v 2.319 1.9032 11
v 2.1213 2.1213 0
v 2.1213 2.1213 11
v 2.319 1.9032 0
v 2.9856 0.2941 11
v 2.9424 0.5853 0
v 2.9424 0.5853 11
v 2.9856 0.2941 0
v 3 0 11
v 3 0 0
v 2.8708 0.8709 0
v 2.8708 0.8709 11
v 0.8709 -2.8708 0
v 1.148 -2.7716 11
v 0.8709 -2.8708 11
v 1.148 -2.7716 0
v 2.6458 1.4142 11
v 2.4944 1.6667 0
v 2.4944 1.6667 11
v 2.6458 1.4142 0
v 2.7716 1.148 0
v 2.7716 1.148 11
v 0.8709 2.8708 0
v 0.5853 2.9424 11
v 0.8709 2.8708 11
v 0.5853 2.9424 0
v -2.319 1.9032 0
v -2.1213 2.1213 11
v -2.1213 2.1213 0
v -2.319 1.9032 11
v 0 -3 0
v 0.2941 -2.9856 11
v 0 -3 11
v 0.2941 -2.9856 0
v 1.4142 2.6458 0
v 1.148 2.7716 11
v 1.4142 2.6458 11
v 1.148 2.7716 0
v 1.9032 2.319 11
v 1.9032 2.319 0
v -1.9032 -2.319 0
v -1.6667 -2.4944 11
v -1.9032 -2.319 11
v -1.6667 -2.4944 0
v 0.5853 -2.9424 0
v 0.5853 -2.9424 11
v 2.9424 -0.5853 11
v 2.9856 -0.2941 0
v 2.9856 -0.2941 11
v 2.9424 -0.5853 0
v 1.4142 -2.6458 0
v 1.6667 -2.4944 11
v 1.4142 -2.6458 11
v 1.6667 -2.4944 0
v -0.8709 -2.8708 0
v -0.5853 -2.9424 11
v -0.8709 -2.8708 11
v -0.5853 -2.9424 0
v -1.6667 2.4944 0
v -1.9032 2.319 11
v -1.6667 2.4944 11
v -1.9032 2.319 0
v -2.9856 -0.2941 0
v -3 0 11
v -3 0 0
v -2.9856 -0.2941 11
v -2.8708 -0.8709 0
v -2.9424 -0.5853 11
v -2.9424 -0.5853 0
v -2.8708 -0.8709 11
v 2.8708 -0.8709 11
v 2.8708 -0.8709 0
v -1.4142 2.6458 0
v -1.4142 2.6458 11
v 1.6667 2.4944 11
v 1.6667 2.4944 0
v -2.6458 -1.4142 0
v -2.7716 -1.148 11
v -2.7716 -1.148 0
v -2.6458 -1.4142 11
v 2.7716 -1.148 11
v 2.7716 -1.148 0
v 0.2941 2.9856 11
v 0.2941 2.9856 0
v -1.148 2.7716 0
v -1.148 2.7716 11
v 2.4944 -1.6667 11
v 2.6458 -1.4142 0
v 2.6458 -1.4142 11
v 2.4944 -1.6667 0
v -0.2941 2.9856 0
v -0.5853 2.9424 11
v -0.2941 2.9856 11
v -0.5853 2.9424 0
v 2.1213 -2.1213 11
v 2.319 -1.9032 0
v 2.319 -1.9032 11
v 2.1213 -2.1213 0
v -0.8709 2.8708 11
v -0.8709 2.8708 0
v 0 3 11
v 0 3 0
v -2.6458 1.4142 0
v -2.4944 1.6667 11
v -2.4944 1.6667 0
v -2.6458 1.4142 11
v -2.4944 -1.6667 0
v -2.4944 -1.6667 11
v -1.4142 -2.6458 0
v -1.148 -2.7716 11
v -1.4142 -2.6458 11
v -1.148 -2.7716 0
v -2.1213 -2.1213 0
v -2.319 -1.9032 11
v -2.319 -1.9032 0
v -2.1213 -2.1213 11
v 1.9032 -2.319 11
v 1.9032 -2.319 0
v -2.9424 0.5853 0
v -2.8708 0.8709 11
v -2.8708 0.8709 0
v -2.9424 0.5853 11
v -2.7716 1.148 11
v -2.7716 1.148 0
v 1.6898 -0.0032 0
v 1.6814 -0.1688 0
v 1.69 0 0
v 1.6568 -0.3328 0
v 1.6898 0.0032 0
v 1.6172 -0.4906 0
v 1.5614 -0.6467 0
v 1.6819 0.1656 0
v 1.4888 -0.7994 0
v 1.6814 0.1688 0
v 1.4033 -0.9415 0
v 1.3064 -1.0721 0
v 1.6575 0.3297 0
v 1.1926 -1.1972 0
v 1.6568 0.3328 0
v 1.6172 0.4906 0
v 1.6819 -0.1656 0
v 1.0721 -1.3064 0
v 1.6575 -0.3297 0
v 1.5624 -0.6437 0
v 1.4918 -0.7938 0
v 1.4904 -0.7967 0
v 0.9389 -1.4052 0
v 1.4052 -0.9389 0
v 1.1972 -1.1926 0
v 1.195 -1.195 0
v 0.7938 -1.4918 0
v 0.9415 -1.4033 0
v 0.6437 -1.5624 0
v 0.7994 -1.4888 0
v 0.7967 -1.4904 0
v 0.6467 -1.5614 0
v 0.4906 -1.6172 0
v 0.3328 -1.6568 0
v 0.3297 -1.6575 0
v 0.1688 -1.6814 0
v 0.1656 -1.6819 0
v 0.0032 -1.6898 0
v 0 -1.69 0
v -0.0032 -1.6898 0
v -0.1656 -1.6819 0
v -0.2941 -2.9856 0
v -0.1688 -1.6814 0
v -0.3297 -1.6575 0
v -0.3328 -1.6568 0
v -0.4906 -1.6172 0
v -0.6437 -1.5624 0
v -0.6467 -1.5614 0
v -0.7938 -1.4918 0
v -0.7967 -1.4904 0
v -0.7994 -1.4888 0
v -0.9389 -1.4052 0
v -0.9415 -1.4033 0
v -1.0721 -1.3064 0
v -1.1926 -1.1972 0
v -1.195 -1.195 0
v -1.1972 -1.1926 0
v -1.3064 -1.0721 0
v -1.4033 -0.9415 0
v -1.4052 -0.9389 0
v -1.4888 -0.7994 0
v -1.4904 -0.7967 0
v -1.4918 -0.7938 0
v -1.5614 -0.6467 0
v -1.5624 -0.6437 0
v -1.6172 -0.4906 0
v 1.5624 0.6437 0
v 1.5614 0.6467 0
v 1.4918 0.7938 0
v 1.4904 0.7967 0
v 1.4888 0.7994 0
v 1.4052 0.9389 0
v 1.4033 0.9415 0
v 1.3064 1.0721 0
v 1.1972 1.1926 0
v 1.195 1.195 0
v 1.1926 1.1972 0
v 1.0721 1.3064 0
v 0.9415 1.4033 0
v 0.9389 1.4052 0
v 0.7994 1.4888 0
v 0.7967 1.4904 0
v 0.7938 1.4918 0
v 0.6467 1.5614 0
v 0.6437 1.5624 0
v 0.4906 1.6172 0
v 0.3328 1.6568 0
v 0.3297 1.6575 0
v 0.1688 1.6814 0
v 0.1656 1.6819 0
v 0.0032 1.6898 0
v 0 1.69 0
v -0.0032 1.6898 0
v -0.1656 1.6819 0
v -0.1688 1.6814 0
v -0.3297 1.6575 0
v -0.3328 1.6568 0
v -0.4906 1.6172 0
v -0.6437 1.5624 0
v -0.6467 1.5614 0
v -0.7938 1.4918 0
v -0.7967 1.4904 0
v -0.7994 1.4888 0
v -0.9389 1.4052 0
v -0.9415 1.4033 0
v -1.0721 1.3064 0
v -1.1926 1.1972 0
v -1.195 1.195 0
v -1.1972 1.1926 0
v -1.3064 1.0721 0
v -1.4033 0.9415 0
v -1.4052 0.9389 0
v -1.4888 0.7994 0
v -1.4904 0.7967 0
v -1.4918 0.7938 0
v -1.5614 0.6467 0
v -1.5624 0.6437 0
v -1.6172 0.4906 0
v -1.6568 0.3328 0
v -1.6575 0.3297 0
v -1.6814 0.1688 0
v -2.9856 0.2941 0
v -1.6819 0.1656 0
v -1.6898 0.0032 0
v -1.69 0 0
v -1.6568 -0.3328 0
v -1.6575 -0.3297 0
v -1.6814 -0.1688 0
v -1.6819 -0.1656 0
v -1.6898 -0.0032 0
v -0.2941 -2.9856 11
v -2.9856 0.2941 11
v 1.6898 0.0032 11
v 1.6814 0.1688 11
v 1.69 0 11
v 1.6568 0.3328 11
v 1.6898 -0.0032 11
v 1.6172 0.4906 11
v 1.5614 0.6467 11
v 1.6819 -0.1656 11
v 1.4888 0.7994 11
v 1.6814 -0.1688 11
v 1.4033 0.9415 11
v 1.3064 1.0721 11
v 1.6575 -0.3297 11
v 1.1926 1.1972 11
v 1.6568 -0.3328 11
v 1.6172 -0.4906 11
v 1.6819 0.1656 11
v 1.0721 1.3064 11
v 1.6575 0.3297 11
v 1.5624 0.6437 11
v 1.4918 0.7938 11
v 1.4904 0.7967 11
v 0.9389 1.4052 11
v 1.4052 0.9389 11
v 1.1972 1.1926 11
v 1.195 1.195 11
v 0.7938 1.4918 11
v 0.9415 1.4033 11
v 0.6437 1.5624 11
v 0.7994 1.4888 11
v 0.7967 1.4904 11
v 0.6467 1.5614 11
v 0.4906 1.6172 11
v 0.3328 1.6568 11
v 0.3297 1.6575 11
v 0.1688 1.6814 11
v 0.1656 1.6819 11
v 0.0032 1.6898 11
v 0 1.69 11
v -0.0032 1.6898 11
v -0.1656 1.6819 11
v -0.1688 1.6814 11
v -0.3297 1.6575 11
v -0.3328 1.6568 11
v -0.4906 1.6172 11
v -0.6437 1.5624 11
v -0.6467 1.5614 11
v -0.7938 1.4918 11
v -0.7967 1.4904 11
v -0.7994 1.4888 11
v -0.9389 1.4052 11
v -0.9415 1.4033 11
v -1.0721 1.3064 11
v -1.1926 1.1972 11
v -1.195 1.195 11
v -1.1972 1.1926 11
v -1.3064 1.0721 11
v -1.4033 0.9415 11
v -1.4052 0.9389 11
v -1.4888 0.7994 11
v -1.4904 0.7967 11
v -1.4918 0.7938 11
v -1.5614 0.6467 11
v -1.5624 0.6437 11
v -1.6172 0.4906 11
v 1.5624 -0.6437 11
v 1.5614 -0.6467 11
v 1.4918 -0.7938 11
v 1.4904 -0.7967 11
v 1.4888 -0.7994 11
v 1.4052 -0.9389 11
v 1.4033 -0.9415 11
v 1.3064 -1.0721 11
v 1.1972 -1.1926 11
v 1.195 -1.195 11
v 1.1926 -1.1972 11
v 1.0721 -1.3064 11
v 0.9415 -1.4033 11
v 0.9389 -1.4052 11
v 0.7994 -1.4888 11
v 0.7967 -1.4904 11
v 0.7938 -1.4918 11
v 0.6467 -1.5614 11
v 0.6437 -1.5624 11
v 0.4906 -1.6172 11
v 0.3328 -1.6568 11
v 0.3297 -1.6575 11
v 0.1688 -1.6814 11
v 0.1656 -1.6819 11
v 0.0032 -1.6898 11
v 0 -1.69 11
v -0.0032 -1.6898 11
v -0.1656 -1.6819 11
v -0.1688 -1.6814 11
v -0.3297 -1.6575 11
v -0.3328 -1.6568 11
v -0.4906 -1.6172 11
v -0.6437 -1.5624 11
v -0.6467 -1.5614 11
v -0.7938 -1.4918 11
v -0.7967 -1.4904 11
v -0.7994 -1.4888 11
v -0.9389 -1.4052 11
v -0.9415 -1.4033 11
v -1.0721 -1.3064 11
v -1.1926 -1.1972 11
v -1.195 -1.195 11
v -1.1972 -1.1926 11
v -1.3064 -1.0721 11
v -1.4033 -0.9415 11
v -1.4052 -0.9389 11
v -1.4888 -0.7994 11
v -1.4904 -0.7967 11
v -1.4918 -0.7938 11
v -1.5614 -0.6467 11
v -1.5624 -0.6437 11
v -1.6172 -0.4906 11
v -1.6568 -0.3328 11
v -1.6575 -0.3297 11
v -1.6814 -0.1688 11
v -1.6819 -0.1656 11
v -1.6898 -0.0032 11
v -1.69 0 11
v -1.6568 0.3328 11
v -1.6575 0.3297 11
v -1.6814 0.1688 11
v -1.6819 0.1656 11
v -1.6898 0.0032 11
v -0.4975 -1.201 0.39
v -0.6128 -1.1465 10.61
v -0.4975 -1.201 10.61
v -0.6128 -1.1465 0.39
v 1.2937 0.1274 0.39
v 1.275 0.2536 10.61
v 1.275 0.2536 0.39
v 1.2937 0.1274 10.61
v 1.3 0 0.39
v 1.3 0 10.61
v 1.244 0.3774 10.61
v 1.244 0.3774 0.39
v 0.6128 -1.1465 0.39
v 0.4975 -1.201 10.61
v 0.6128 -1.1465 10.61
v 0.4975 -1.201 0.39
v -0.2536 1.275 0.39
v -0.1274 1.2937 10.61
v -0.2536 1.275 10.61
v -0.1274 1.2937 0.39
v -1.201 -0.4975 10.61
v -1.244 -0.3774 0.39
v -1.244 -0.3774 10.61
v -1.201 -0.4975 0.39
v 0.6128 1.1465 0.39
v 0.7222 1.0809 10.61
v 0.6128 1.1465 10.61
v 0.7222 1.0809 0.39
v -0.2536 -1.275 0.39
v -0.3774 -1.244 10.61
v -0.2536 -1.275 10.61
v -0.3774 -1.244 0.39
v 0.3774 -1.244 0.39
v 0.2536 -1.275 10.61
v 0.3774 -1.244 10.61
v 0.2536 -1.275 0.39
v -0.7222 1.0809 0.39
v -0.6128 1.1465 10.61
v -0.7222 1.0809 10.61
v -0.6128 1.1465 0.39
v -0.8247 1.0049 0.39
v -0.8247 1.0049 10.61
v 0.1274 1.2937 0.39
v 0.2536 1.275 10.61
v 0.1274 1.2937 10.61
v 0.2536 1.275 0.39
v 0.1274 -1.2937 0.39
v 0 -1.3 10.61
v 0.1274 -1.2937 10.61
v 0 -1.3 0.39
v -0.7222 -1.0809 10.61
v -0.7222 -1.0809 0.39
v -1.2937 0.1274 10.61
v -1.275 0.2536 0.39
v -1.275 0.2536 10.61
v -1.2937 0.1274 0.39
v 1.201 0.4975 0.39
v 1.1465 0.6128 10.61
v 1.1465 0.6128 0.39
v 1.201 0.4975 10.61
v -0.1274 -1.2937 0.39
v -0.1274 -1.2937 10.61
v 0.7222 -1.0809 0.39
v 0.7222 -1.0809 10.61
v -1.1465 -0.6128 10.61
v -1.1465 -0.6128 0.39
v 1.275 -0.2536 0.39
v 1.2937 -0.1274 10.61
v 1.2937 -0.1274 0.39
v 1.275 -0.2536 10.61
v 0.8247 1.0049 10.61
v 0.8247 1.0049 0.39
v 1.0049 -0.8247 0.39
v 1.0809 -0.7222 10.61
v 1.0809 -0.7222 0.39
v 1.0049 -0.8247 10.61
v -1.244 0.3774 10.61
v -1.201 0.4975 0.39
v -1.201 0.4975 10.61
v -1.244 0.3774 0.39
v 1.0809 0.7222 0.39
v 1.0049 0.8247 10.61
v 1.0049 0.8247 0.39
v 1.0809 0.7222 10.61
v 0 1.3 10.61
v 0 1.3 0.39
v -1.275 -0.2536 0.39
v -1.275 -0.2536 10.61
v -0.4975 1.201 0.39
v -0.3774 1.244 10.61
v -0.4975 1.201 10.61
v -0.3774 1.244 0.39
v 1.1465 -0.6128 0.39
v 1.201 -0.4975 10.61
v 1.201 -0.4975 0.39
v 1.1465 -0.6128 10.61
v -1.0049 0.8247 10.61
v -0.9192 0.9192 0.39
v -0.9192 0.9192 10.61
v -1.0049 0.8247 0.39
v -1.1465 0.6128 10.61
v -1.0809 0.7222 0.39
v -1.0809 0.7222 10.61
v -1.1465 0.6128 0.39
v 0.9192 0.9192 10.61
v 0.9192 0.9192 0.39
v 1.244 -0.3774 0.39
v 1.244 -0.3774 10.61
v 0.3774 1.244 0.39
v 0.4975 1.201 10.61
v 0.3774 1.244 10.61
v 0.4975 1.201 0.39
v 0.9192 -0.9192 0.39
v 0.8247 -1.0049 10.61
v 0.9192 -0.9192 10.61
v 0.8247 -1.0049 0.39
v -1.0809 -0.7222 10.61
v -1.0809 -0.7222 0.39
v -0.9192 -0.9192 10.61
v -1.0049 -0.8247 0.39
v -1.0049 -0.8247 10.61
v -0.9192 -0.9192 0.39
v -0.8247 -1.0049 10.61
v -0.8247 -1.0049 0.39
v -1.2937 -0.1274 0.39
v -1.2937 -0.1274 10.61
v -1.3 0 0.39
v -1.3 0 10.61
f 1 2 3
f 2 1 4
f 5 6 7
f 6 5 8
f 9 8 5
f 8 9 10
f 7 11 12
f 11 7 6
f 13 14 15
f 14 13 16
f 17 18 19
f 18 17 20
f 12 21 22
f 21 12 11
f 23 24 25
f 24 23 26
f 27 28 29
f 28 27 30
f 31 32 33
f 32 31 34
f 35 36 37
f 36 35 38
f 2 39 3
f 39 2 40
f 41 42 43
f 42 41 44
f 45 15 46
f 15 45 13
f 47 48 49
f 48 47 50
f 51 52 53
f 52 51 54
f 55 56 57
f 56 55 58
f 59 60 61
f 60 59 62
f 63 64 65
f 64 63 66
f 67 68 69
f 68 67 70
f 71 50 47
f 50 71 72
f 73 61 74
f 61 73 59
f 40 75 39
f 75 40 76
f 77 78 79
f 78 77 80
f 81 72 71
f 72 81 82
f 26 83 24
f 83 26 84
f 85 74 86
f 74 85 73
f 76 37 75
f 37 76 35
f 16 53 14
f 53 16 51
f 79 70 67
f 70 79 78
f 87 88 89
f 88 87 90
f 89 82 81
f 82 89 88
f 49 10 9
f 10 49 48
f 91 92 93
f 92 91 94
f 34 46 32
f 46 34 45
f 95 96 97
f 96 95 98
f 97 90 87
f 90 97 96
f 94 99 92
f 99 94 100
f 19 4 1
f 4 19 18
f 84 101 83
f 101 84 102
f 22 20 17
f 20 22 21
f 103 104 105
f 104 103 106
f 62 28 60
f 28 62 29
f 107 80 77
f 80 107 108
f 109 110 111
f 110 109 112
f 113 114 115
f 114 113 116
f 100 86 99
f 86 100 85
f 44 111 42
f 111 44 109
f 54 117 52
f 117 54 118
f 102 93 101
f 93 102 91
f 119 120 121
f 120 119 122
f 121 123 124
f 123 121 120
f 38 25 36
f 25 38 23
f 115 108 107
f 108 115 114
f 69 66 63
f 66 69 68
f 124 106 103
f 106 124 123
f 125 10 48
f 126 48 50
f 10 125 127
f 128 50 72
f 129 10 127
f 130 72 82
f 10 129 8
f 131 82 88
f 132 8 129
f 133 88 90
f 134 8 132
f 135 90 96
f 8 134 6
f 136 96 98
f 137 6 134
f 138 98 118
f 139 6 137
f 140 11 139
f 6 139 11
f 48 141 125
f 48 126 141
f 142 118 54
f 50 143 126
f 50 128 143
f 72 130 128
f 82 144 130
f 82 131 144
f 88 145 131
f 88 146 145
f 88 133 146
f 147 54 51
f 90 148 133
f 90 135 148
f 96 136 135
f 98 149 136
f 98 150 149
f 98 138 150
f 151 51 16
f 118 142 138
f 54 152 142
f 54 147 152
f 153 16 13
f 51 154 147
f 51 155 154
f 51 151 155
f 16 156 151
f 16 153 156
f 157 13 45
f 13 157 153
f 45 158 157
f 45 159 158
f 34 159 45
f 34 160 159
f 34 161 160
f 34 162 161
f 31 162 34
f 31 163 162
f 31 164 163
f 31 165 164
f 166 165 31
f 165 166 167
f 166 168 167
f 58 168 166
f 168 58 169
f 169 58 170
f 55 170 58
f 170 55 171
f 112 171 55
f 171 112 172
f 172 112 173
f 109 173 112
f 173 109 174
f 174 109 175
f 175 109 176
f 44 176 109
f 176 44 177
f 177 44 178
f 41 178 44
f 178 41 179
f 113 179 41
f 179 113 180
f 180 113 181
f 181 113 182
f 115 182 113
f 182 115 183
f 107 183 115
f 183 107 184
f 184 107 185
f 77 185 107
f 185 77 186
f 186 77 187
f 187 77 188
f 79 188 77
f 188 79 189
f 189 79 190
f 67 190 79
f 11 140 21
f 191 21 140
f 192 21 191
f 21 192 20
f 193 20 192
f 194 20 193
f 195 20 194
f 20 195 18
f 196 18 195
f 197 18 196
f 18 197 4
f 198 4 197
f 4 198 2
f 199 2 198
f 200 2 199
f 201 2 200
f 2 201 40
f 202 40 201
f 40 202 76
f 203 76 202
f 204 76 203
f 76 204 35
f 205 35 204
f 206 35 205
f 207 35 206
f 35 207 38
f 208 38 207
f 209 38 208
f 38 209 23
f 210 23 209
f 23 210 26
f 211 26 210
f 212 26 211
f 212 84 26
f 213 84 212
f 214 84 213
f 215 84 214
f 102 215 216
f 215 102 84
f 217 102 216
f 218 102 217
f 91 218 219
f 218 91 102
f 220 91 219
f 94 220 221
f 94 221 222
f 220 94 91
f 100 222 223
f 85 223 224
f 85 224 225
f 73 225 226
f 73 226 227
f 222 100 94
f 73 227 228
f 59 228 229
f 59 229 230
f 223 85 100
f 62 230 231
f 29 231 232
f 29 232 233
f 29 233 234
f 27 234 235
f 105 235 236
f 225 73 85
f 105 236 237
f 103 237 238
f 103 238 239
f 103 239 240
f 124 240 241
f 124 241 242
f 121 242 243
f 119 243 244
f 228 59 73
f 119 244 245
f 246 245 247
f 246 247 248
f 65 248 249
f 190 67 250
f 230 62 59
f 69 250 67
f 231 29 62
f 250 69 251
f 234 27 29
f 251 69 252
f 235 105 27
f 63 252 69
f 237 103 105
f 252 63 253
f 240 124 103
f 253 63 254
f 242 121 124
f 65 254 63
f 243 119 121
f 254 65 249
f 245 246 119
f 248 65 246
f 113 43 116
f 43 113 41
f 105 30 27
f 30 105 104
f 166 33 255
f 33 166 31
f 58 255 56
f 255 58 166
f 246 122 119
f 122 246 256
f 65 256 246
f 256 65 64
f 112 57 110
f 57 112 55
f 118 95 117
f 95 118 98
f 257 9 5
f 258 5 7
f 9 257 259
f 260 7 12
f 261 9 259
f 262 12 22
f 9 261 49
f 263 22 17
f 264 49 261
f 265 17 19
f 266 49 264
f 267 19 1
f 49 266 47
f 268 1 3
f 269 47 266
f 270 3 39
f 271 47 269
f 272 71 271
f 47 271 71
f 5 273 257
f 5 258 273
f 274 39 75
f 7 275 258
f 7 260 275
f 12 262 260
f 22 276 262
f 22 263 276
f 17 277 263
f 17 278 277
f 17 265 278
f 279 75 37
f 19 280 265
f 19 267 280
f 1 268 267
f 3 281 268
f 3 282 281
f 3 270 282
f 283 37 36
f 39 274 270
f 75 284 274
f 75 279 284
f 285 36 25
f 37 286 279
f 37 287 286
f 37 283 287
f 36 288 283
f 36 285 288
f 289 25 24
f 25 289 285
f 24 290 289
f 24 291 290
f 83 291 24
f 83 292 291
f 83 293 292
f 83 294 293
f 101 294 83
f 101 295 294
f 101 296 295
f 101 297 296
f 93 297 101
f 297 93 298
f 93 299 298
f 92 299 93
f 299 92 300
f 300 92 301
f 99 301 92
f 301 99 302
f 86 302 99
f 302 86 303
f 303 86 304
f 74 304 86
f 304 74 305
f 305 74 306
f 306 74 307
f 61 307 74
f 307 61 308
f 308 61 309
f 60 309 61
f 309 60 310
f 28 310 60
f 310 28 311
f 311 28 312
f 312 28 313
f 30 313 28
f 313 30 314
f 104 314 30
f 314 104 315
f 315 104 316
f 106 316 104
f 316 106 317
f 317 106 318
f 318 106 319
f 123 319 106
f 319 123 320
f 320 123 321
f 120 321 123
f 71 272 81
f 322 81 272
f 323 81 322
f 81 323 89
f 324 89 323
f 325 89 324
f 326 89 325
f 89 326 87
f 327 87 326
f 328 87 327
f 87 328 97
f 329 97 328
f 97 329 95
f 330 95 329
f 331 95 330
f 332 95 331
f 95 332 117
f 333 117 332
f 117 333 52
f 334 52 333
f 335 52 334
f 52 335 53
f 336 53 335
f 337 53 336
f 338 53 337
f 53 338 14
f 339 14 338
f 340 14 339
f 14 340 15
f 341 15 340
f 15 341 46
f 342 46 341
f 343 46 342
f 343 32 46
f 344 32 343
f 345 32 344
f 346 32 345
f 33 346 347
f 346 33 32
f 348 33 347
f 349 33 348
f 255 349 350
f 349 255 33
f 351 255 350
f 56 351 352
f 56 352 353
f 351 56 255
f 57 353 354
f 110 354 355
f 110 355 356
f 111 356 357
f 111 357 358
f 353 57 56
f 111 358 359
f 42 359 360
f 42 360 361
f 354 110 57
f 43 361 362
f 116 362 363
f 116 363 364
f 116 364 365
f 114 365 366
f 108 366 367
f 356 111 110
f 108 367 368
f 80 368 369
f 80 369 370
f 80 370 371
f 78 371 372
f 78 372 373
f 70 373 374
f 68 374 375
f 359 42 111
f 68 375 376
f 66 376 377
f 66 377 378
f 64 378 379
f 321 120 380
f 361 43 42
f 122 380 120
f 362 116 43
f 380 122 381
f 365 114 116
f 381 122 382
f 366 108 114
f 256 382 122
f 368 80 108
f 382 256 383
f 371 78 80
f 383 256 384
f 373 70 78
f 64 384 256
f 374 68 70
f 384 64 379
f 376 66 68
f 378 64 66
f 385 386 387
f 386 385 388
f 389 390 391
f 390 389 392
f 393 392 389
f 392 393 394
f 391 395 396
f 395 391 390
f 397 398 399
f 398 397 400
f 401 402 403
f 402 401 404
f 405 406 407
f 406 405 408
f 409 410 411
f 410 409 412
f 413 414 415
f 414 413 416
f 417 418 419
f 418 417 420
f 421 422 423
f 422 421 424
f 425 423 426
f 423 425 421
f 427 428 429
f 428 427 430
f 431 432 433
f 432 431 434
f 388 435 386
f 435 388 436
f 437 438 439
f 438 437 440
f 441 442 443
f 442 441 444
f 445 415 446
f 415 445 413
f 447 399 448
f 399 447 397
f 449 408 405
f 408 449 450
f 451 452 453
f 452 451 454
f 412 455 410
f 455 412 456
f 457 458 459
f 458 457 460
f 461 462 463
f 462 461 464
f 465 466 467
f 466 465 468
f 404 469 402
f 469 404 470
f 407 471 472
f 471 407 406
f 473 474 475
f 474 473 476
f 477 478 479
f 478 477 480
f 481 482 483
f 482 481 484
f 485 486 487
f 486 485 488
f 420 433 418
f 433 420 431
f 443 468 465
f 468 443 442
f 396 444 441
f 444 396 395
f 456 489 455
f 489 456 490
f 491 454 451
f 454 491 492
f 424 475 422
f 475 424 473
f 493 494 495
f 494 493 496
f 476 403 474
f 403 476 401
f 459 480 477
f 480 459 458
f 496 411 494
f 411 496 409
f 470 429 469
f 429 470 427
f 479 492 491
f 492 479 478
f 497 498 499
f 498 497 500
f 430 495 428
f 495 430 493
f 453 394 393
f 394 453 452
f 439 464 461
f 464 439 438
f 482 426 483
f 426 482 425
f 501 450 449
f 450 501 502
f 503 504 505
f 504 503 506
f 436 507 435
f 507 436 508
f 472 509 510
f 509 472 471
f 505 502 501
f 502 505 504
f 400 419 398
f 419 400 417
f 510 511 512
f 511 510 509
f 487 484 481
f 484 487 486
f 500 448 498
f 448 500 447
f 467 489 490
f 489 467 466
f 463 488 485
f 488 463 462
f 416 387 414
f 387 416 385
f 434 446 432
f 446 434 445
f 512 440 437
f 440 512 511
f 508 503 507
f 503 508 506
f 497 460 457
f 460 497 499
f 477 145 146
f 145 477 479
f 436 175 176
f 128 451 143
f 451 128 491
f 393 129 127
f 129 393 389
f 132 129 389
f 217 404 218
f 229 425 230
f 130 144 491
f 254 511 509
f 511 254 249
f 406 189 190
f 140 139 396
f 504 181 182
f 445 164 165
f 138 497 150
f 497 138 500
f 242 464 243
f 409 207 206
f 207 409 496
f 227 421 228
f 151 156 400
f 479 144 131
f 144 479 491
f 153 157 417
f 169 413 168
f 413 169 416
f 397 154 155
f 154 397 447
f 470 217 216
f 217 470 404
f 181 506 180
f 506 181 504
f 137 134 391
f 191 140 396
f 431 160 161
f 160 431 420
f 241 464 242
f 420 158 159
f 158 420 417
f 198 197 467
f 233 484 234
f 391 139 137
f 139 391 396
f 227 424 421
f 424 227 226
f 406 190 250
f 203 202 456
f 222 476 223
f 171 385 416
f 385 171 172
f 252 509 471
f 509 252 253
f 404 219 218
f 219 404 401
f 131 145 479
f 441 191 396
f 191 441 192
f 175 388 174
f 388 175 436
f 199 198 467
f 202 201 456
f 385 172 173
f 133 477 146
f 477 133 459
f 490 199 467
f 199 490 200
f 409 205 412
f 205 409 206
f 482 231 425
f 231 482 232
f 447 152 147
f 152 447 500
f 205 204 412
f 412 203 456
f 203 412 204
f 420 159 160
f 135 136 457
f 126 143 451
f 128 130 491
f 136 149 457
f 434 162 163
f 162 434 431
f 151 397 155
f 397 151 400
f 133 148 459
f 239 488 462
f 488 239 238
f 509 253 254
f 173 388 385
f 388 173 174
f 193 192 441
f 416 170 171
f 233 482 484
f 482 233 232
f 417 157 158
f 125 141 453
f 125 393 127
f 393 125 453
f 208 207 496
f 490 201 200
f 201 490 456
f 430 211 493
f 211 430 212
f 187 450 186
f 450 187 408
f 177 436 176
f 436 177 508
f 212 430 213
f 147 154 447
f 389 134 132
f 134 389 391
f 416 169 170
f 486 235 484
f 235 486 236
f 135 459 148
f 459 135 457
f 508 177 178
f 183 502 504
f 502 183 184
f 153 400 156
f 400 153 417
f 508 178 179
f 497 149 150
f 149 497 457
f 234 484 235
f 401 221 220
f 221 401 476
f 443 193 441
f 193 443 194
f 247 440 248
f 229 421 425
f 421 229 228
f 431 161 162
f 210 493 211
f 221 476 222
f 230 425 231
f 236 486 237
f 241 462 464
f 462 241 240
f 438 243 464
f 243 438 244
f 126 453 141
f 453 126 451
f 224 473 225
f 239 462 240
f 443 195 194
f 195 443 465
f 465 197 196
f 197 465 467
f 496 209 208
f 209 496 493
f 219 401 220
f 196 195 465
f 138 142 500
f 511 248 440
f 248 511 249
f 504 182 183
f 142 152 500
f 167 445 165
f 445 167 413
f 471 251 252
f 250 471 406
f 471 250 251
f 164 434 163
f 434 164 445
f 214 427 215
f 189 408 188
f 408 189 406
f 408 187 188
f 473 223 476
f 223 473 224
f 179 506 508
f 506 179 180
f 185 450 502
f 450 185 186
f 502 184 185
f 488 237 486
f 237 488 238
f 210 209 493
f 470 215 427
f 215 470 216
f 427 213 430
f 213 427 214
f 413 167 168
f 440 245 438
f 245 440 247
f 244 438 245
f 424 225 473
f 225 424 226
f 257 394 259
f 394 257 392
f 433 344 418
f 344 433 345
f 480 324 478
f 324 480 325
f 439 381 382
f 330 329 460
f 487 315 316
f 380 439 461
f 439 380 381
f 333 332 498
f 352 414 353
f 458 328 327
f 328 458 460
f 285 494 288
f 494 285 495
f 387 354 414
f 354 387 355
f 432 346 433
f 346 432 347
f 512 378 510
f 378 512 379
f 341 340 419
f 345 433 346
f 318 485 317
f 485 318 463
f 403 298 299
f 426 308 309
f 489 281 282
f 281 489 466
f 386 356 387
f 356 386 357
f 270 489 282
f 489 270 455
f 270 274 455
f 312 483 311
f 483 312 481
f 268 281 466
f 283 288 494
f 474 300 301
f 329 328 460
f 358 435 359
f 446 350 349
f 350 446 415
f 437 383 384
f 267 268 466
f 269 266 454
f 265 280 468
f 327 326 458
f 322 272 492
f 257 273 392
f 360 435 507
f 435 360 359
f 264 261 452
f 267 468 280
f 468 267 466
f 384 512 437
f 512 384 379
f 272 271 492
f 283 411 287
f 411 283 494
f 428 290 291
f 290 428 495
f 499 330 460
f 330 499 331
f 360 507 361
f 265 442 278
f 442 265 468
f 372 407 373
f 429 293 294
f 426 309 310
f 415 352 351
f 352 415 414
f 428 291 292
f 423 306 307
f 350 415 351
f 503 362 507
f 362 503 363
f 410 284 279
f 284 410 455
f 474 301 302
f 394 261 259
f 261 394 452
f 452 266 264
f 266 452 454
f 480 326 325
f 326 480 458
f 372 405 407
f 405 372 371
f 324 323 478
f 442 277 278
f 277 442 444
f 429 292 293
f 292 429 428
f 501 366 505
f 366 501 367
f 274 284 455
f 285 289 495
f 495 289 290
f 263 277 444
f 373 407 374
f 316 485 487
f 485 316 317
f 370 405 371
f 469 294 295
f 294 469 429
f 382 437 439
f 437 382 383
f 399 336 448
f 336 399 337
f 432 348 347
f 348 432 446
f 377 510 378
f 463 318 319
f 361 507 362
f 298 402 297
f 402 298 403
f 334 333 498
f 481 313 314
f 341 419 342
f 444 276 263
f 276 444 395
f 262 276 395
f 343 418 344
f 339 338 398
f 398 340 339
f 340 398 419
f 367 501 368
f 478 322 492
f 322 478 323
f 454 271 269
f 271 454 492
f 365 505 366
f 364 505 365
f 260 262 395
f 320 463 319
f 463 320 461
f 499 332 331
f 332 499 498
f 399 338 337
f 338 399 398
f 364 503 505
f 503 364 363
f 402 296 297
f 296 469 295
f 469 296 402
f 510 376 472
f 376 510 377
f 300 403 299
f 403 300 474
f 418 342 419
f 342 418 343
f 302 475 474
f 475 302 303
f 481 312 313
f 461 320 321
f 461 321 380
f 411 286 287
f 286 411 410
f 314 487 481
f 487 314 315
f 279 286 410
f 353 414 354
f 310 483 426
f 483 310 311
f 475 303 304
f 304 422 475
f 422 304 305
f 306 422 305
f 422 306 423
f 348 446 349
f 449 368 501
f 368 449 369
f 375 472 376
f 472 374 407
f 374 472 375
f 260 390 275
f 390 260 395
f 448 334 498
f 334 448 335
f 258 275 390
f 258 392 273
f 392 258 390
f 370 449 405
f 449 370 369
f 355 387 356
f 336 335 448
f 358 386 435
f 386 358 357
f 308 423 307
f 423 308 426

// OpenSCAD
// Spacers for the Mini Floppy Emulator (main PCB + cover PCB).
// Measured by Stefan: gap between boards 11 mm, mounting holes about 3 mm.
// Assumed: PCB thickness 1.6 mm. All values in mm.

part = "screw_spacer"; // [screw_spacer, snap_sleeve, snap_pin]

gap       = 11.0;  // distance between the boards
pcb       = 1.6;   // board thickness (assumed)
hole      = 3.0;   // board hole
od        = 6.0;   // outer diameter of spacer / sleeve

// Variant A: spacer, M3 screws from both sides cut their own thread
screw_core = 2.6;  // pilot bore for M3 self-cutting into plastic

// Variant B: sleeve with snap pins from top and bottom
lip_len   = 2.0;   // catch lip at each sleeve end
lip_d     = 2.9;   // lip bore (shank passes, barb snaps behind)
mid_d     = 3.6;   // wide bore in the middle
head_d    = 6.0;   // pin head diameter
head_h    = 1.2;   // pin head height
shank_d   = 2.8;   // pin shank, fits the 3 mm board hole
barb_d    = 3.4;   // barb diameter, snaps behind the lip
barb_len  = 1.8;   // barb length
slot_w    = 0.8;   // slot that lets the barb compress
slot_len  = 4.0;   // slot length from the tip

$fn = 64;

module screw_spacer() {
    difference() {
        cylinder(d = od, h = gap);
        translate([0, 0, -1]) cylinder(d = screw_core, h = gap + 2);
        // small entry chamfers so the screw starts straight
        translate([0, 0, -0.01]) cylinder(d1 = screw_core + 0.8, d2 = screw_core, h = 0.4);
        translate([0, 0, gap - 0.39]) cylinder(d1 = screw_core, d2 = screw_core + 0.8, h = 0.4);
    }
}

module snap_sleeve() {
    difference() {
        cylinder(d = od, h = gap);
        translate([0, 0, -1]) cylinder(d = lip_d, h = gap + 2);
        translate([0, 0, lip_len]) cylinder(d = mid_d, h = gap - 2 * lip_len);
        // entry chamfers guide the barb into the lip
        translate([0, 0, -0.01]) cylinder(d1 = lip_d + 0.6, d2 = lip_d, h = 0.3);
        translate([0, 0, gap - 0.29]) cylinder(d1 = lip_d, d2 = lip_d + 0.6, h = 0.3);
    }
}

// Pin printed head down. Shank length = board + lip (+play), so the barb sits
// just behind the lip when the head rests on the board.
module snap_pin() {
    shank_len = pcb + lip_len + 0.1; // 0.1 play so the barb clears the lip
    tip = 0.6;
    difference() {
        union() {
            cylinder(d = head_d, h = head_h);
            translate([0, 0, head_h]) cylinder(d = shank_d, h = shank_len);
            translate([0, 0, head_h + shank_len]) cylinder(d = barb_d, h = barb_len - tip);
            translate([0, 0, head_h + shank_len + barb_len - tip]) cylinder(d1 = barb_d, d2 = shank_d - 0.6, h = tip);
        }
        translate([-slot_w / 2, -od, head_h + shank_len + barb_len - slot_len]) cube([slot_w, 2 * od, slot_len + 1]);
    }
}

if (part == "screw_spacer") screw_spacer();
if (part == "snap_sleeve")  snap_sleeve();
if (part == "snap_pin")     snap_pin();
